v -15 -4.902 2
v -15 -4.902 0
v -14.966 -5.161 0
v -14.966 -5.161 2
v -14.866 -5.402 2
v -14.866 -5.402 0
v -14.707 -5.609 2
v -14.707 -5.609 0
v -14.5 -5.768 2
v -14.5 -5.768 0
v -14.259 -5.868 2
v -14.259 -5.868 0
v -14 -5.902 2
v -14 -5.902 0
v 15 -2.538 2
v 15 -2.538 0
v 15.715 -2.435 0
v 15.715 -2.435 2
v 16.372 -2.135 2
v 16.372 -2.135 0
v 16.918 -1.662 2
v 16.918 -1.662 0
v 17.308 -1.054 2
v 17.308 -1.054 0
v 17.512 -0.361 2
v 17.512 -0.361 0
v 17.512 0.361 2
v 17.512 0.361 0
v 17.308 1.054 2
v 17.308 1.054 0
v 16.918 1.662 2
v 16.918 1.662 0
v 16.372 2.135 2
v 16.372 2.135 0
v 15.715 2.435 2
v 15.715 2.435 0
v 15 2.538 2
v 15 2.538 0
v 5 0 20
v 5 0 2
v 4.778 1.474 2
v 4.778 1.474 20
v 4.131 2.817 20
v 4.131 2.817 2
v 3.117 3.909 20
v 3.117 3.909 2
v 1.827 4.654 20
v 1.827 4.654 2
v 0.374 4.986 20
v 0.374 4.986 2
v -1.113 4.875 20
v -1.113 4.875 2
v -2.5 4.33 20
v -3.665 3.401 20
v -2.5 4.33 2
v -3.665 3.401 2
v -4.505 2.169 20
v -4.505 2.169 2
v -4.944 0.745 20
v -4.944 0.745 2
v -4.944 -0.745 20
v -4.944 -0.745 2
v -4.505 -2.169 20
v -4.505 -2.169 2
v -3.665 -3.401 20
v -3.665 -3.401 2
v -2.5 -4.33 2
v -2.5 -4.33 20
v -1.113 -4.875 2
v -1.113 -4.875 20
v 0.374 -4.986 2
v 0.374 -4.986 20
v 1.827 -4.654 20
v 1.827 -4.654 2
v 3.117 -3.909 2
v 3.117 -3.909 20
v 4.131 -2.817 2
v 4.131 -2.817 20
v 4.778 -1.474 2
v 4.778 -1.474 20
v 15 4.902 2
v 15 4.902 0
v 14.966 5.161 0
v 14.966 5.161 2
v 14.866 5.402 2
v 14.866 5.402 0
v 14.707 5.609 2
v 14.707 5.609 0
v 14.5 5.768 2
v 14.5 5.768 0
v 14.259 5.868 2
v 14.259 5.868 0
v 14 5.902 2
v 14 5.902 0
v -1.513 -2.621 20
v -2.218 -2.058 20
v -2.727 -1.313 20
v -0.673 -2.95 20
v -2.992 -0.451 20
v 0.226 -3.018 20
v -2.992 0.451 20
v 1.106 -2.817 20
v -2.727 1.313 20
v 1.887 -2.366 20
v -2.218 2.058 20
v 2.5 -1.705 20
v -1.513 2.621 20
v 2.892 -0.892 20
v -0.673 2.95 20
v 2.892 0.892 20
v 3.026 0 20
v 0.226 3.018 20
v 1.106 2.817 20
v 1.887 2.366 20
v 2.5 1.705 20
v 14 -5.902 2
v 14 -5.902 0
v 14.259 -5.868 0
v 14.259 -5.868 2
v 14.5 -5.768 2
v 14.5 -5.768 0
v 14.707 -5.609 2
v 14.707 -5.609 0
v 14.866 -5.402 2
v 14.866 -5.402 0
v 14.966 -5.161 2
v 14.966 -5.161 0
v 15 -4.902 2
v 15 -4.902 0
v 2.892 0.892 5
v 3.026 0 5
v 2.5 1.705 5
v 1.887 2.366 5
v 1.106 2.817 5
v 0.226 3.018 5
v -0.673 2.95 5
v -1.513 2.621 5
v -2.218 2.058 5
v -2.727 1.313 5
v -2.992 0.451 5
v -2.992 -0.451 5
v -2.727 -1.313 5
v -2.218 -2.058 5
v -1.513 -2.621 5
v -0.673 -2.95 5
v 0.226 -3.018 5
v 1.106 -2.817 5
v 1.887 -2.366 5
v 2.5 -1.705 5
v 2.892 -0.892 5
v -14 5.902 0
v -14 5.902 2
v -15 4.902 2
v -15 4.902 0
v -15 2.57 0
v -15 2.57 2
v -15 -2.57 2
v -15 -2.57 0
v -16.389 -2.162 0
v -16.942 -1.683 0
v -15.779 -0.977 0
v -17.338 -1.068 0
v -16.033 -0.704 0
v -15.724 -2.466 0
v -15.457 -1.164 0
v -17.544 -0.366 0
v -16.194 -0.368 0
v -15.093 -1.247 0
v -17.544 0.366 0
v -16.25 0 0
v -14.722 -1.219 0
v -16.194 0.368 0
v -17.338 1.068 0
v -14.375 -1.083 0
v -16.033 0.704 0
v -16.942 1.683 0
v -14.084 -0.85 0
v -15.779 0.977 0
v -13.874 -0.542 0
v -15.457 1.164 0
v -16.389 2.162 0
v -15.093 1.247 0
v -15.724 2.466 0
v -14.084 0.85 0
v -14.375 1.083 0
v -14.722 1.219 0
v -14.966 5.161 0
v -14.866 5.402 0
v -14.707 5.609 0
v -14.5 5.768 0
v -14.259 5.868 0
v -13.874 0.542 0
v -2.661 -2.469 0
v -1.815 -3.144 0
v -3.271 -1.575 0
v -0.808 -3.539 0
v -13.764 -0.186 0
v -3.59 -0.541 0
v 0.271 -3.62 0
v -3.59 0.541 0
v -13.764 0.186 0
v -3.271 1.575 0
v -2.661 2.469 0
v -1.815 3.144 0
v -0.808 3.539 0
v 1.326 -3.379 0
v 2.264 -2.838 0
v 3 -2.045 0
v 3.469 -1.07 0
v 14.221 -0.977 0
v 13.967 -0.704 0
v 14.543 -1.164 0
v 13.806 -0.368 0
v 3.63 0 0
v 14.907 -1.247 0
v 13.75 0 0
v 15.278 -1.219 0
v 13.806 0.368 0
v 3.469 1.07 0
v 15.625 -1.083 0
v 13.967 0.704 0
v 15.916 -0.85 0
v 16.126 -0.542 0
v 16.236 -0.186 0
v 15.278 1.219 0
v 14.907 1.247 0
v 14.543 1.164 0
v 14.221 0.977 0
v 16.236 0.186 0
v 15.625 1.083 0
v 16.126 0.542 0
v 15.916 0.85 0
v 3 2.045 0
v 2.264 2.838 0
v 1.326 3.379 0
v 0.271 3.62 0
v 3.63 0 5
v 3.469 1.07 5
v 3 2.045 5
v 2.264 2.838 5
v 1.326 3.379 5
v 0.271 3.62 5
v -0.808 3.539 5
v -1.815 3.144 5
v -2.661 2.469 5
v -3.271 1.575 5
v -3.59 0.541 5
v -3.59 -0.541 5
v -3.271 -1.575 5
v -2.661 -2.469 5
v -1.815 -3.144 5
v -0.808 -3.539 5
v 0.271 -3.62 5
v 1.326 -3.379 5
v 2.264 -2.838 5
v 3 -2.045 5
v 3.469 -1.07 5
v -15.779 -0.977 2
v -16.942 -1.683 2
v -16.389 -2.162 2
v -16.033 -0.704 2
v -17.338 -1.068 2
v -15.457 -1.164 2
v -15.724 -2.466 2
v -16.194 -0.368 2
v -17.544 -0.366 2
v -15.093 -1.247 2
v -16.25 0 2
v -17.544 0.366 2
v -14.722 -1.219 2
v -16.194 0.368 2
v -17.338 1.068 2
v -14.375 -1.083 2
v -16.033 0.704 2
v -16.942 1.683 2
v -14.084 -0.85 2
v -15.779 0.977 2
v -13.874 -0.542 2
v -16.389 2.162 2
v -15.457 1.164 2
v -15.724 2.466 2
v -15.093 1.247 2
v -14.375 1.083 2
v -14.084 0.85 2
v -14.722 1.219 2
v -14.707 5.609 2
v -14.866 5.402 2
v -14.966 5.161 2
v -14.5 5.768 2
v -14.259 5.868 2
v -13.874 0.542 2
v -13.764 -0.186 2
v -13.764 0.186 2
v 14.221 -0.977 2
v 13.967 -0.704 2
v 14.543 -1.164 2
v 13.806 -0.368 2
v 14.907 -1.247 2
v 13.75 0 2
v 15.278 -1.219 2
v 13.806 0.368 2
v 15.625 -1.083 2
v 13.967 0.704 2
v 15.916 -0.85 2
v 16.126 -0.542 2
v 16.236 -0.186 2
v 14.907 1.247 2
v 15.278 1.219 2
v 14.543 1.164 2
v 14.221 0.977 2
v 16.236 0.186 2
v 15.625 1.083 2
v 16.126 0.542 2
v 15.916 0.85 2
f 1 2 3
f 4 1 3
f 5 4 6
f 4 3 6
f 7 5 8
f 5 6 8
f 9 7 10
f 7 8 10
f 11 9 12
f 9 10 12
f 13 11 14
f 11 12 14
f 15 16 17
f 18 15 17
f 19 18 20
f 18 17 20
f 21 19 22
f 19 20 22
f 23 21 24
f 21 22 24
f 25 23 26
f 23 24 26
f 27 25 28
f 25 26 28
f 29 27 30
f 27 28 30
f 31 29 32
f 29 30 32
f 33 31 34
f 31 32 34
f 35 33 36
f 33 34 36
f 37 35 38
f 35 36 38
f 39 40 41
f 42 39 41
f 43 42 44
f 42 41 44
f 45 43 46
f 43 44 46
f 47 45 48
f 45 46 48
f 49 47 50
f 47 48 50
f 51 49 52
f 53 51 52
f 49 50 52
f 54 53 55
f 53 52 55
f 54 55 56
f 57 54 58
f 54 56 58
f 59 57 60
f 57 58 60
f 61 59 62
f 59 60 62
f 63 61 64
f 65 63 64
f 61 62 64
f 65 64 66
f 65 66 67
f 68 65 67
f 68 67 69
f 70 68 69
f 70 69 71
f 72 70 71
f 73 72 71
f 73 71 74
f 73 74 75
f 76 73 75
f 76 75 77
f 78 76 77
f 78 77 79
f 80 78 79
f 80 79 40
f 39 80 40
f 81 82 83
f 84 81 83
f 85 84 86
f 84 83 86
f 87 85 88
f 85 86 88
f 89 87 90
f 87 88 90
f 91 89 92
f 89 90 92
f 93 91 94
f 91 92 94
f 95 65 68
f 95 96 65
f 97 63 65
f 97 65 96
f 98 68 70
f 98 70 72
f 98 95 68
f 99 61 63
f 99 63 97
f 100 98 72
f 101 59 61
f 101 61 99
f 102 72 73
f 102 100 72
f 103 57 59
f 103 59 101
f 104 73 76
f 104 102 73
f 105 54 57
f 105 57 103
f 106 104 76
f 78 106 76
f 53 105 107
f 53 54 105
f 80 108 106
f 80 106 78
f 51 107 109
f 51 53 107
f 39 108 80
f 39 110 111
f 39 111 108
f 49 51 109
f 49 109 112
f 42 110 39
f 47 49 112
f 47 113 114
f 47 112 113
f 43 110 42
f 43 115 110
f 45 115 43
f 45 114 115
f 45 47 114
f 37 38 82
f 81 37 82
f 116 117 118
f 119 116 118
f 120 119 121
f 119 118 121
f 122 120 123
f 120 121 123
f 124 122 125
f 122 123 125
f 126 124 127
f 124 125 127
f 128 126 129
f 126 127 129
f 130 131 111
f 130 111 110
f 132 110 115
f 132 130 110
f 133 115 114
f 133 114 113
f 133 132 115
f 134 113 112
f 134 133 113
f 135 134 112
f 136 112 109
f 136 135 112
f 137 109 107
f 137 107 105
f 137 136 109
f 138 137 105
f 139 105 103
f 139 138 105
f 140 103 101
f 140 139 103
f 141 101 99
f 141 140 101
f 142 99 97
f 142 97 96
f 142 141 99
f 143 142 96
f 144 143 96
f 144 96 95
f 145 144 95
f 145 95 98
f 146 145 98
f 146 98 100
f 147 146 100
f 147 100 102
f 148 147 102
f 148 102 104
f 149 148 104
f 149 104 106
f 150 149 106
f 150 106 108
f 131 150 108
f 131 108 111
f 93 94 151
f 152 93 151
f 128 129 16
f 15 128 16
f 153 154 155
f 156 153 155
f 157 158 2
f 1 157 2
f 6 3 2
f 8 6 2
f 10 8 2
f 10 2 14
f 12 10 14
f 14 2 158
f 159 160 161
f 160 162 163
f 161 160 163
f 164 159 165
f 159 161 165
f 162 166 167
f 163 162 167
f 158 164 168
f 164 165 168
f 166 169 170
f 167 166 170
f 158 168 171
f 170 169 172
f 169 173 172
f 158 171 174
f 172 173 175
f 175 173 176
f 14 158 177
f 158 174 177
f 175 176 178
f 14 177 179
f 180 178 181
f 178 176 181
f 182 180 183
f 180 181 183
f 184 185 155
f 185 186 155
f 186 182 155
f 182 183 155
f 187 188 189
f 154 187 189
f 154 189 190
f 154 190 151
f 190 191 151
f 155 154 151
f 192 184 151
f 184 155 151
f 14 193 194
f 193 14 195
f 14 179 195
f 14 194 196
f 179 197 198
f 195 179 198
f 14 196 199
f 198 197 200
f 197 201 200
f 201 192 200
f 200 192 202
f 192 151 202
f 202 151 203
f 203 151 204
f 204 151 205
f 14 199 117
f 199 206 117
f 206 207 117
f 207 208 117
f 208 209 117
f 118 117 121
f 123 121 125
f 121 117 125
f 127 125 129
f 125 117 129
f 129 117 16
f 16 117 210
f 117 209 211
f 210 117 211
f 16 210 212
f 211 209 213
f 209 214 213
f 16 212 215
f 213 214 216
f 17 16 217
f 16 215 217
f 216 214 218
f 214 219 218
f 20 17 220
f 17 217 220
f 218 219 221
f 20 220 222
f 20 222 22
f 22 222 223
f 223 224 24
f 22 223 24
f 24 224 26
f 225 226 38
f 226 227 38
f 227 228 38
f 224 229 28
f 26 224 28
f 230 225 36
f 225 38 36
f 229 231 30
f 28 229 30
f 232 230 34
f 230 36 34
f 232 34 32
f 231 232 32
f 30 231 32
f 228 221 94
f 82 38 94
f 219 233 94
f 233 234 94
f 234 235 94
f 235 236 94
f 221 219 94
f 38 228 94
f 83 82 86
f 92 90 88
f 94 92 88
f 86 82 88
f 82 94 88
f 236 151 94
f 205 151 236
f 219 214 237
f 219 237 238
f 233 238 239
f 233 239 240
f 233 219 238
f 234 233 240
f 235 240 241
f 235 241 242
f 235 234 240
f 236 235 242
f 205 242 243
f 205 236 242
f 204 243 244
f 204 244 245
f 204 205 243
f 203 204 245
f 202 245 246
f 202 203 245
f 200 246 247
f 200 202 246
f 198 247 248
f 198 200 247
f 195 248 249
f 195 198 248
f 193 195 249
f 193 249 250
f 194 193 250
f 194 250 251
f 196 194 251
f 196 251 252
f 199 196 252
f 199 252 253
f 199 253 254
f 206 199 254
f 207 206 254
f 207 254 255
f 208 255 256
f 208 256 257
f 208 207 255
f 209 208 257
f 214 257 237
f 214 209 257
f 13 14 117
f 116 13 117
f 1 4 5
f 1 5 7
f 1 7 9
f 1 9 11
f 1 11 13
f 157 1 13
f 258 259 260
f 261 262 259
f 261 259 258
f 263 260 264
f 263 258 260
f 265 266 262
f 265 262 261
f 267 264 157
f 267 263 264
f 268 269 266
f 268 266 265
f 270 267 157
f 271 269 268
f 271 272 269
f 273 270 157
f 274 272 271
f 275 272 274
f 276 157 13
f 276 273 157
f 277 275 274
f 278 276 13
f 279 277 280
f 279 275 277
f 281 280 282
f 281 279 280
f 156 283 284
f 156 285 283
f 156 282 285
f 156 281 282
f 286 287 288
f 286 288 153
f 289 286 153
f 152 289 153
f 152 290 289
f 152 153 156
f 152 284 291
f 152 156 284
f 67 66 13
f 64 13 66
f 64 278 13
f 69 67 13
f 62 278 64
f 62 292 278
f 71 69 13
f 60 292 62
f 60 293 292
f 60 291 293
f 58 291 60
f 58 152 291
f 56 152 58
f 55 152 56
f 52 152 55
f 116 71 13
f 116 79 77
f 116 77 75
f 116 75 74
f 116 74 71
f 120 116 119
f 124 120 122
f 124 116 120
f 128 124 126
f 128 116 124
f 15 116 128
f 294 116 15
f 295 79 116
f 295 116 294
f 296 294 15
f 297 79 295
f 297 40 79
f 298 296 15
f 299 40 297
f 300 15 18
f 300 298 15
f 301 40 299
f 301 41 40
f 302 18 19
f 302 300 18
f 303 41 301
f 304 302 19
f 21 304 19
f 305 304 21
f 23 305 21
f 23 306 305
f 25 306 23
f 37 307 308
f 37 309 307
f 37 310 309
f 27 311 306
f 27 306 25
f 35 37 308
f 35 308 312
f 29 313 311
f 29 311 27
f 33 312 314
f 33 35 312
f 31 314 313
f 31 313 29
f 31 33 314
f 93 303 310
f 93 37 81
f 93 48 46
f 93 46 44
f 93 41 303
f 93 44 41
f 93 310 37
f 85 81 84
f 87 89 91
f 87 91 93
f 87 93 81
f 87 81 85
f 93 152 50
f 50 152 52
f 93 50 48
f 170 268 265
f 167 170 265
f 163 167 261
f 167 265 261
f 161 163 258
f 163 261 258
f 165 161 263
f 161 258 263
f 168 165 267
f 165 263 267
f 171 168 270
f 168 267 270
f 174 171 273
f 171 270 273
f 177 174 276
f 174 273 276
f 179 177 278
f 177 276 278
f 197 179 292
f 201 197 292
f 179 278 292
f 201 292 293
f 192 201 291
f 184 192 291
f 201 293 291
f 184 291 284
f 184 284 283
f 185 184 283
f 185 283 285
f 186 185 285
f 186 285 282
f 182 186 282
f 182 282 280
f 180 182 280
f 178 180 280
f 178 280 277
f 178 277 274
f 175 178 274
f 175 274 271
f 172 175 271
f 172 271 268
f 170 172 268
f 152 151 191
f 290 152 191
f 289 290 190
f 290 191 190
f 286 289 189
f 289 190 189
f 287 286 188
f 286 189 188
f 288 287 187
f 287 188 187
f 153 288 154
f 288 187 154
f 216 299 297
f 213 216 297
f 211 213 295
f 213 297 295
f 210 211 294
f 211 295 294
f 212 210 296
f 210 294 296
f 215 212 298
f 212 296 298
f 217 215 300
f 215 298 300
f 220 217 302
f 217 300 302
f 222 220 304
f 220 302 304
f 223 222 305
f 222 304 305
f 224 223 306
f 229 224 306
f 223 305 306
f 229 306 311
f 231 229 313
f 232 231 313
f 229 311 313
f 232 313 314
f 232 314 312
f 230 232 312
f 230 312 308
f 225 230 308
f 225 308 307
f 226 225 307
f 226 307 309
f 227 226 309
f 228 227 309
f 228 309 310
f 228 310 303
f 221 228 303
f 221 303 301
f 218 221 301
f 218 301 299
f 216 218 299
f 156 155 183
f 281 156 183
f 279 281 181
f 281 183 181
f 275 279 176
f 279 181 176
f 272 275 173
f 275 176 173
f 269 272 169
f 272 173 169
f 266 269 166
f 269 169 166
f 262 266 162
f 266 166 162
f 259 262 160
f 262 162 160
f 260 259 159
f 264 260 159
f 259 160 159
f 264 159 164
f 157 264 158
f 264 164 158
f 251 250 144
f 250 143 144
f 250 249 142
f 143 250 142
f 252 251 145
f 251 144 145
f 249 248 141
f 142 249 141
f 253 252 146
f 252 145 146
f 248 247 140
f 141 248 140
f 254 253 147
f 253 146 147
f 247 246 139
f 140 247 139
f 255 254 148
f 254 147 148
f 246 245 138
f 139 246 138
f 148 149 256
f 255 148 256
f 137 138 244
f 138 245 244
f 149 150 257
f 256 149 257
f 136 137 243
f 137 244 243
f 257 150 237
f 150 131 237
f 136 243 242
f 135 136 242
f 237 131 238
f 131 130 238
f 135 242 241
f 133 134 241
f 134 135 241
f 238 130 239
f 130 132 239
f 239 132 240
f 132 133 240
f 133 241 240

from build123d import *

# Parameters (mm, degrees)
F0_R     = 5
F0_R_2   = 3.6304219053
F0_R_3   = 3.0262783812
F1_DEPTH = 2
F2_DEPTH = 20
F3_D     = 2.5
F3_DEPTH = 10
F3_TIP   = 0.7510757738
F4_DEPTH = 5


with BuildPart() as f1:
    # F0 (on Top) → F1 (new body)
    with BuildSketch(Plane.XY):
        with BuildLine():
            Line((-14, -5.9018372558), (14, -5.9018372558))
            ThreePointArc((14, -5.9018372558), (14.7071067812, -5.608944037), (15, -4.9018372558))
            Line((15, -4.9018372558), (15, -2.5376267174))
            ThreePointArc((15, -2.5376267174), (17.5376267174, 0), (15, 2.5376267174))
            Line((15, 2.5376267174), (15, 4.9018372558))
            ThreePointArc((15, 4.9018372558), (14.7071067812, 5.608944037), (14, 5.9018372558))
            Line((14, 5.9018372558), (-14, 5.9018372558))
            ThreePointArc((-14, 5.9018372558), (-14.7071067812, 5.608944037), (-15, 4.9018372558))
            Line((-15, 4.9018372558), (-15, 2.5700507666))
            ThreePointArc((-15, 2.5700507666), (-17.5700507666, 0), (-15, -2.5700507666))
            Line((-15, -2.5700507666), (-15, -4.9018372558))
            ThreePointArc((-15, -4.9018372558), (-14.7071067812, -5.608944037), (-14, -5.9018372558))
        make_face()
        Circle(F0_R, mode=Mode.SUBTRACT)
        Circle(F0_R)
        Circle(F0_R_2, mode=Mode.SUBTRACT)
        Circle(F0_R_2)
        Circle(F0_R_3, mode=Mode.SUBTRACT)
    extrude(amount=F1_DEPTH)

    # F0 (on Top) → F2 (join)
    with BuildSketch(Plane.XY):
        Circle(F0_R)
        Circle(F0_R_2, mode=Mode.SUBTRACT)
        Circle(F0_R_2)
        Circle(F0_R_3, mode=Mode.SUBTRACT)
    extrude(amount=F2_DEPTH)

    # F3
    with Locations(Plane(origin=(0, 0, 0), x_dir=(1, 0, 0), z_dir=(0, 0, -1))):
        with Locations((-15, 0), (15, 0)):
            Hole(F3_D / 2, depth=F3_DEPTH)
            with Locations((0, 0, -(F3_DEPTH + F3_TIP / 2))):  # 118° drill point
                Cone(0, F3_D / 2, F3_TIP, mode=Mode.SUBTRACT)

    # F0 (on Top) → F4 (cut)
    with BuildSketch(Plane.XY):
        Circle(F0_R_2)
        Circle(F0_R_3, mode=Mode.SUBTRACT)
    extrude(amount=F4_DEPTH, mode=Mode.SUBTRACT)


solid = f1.part
